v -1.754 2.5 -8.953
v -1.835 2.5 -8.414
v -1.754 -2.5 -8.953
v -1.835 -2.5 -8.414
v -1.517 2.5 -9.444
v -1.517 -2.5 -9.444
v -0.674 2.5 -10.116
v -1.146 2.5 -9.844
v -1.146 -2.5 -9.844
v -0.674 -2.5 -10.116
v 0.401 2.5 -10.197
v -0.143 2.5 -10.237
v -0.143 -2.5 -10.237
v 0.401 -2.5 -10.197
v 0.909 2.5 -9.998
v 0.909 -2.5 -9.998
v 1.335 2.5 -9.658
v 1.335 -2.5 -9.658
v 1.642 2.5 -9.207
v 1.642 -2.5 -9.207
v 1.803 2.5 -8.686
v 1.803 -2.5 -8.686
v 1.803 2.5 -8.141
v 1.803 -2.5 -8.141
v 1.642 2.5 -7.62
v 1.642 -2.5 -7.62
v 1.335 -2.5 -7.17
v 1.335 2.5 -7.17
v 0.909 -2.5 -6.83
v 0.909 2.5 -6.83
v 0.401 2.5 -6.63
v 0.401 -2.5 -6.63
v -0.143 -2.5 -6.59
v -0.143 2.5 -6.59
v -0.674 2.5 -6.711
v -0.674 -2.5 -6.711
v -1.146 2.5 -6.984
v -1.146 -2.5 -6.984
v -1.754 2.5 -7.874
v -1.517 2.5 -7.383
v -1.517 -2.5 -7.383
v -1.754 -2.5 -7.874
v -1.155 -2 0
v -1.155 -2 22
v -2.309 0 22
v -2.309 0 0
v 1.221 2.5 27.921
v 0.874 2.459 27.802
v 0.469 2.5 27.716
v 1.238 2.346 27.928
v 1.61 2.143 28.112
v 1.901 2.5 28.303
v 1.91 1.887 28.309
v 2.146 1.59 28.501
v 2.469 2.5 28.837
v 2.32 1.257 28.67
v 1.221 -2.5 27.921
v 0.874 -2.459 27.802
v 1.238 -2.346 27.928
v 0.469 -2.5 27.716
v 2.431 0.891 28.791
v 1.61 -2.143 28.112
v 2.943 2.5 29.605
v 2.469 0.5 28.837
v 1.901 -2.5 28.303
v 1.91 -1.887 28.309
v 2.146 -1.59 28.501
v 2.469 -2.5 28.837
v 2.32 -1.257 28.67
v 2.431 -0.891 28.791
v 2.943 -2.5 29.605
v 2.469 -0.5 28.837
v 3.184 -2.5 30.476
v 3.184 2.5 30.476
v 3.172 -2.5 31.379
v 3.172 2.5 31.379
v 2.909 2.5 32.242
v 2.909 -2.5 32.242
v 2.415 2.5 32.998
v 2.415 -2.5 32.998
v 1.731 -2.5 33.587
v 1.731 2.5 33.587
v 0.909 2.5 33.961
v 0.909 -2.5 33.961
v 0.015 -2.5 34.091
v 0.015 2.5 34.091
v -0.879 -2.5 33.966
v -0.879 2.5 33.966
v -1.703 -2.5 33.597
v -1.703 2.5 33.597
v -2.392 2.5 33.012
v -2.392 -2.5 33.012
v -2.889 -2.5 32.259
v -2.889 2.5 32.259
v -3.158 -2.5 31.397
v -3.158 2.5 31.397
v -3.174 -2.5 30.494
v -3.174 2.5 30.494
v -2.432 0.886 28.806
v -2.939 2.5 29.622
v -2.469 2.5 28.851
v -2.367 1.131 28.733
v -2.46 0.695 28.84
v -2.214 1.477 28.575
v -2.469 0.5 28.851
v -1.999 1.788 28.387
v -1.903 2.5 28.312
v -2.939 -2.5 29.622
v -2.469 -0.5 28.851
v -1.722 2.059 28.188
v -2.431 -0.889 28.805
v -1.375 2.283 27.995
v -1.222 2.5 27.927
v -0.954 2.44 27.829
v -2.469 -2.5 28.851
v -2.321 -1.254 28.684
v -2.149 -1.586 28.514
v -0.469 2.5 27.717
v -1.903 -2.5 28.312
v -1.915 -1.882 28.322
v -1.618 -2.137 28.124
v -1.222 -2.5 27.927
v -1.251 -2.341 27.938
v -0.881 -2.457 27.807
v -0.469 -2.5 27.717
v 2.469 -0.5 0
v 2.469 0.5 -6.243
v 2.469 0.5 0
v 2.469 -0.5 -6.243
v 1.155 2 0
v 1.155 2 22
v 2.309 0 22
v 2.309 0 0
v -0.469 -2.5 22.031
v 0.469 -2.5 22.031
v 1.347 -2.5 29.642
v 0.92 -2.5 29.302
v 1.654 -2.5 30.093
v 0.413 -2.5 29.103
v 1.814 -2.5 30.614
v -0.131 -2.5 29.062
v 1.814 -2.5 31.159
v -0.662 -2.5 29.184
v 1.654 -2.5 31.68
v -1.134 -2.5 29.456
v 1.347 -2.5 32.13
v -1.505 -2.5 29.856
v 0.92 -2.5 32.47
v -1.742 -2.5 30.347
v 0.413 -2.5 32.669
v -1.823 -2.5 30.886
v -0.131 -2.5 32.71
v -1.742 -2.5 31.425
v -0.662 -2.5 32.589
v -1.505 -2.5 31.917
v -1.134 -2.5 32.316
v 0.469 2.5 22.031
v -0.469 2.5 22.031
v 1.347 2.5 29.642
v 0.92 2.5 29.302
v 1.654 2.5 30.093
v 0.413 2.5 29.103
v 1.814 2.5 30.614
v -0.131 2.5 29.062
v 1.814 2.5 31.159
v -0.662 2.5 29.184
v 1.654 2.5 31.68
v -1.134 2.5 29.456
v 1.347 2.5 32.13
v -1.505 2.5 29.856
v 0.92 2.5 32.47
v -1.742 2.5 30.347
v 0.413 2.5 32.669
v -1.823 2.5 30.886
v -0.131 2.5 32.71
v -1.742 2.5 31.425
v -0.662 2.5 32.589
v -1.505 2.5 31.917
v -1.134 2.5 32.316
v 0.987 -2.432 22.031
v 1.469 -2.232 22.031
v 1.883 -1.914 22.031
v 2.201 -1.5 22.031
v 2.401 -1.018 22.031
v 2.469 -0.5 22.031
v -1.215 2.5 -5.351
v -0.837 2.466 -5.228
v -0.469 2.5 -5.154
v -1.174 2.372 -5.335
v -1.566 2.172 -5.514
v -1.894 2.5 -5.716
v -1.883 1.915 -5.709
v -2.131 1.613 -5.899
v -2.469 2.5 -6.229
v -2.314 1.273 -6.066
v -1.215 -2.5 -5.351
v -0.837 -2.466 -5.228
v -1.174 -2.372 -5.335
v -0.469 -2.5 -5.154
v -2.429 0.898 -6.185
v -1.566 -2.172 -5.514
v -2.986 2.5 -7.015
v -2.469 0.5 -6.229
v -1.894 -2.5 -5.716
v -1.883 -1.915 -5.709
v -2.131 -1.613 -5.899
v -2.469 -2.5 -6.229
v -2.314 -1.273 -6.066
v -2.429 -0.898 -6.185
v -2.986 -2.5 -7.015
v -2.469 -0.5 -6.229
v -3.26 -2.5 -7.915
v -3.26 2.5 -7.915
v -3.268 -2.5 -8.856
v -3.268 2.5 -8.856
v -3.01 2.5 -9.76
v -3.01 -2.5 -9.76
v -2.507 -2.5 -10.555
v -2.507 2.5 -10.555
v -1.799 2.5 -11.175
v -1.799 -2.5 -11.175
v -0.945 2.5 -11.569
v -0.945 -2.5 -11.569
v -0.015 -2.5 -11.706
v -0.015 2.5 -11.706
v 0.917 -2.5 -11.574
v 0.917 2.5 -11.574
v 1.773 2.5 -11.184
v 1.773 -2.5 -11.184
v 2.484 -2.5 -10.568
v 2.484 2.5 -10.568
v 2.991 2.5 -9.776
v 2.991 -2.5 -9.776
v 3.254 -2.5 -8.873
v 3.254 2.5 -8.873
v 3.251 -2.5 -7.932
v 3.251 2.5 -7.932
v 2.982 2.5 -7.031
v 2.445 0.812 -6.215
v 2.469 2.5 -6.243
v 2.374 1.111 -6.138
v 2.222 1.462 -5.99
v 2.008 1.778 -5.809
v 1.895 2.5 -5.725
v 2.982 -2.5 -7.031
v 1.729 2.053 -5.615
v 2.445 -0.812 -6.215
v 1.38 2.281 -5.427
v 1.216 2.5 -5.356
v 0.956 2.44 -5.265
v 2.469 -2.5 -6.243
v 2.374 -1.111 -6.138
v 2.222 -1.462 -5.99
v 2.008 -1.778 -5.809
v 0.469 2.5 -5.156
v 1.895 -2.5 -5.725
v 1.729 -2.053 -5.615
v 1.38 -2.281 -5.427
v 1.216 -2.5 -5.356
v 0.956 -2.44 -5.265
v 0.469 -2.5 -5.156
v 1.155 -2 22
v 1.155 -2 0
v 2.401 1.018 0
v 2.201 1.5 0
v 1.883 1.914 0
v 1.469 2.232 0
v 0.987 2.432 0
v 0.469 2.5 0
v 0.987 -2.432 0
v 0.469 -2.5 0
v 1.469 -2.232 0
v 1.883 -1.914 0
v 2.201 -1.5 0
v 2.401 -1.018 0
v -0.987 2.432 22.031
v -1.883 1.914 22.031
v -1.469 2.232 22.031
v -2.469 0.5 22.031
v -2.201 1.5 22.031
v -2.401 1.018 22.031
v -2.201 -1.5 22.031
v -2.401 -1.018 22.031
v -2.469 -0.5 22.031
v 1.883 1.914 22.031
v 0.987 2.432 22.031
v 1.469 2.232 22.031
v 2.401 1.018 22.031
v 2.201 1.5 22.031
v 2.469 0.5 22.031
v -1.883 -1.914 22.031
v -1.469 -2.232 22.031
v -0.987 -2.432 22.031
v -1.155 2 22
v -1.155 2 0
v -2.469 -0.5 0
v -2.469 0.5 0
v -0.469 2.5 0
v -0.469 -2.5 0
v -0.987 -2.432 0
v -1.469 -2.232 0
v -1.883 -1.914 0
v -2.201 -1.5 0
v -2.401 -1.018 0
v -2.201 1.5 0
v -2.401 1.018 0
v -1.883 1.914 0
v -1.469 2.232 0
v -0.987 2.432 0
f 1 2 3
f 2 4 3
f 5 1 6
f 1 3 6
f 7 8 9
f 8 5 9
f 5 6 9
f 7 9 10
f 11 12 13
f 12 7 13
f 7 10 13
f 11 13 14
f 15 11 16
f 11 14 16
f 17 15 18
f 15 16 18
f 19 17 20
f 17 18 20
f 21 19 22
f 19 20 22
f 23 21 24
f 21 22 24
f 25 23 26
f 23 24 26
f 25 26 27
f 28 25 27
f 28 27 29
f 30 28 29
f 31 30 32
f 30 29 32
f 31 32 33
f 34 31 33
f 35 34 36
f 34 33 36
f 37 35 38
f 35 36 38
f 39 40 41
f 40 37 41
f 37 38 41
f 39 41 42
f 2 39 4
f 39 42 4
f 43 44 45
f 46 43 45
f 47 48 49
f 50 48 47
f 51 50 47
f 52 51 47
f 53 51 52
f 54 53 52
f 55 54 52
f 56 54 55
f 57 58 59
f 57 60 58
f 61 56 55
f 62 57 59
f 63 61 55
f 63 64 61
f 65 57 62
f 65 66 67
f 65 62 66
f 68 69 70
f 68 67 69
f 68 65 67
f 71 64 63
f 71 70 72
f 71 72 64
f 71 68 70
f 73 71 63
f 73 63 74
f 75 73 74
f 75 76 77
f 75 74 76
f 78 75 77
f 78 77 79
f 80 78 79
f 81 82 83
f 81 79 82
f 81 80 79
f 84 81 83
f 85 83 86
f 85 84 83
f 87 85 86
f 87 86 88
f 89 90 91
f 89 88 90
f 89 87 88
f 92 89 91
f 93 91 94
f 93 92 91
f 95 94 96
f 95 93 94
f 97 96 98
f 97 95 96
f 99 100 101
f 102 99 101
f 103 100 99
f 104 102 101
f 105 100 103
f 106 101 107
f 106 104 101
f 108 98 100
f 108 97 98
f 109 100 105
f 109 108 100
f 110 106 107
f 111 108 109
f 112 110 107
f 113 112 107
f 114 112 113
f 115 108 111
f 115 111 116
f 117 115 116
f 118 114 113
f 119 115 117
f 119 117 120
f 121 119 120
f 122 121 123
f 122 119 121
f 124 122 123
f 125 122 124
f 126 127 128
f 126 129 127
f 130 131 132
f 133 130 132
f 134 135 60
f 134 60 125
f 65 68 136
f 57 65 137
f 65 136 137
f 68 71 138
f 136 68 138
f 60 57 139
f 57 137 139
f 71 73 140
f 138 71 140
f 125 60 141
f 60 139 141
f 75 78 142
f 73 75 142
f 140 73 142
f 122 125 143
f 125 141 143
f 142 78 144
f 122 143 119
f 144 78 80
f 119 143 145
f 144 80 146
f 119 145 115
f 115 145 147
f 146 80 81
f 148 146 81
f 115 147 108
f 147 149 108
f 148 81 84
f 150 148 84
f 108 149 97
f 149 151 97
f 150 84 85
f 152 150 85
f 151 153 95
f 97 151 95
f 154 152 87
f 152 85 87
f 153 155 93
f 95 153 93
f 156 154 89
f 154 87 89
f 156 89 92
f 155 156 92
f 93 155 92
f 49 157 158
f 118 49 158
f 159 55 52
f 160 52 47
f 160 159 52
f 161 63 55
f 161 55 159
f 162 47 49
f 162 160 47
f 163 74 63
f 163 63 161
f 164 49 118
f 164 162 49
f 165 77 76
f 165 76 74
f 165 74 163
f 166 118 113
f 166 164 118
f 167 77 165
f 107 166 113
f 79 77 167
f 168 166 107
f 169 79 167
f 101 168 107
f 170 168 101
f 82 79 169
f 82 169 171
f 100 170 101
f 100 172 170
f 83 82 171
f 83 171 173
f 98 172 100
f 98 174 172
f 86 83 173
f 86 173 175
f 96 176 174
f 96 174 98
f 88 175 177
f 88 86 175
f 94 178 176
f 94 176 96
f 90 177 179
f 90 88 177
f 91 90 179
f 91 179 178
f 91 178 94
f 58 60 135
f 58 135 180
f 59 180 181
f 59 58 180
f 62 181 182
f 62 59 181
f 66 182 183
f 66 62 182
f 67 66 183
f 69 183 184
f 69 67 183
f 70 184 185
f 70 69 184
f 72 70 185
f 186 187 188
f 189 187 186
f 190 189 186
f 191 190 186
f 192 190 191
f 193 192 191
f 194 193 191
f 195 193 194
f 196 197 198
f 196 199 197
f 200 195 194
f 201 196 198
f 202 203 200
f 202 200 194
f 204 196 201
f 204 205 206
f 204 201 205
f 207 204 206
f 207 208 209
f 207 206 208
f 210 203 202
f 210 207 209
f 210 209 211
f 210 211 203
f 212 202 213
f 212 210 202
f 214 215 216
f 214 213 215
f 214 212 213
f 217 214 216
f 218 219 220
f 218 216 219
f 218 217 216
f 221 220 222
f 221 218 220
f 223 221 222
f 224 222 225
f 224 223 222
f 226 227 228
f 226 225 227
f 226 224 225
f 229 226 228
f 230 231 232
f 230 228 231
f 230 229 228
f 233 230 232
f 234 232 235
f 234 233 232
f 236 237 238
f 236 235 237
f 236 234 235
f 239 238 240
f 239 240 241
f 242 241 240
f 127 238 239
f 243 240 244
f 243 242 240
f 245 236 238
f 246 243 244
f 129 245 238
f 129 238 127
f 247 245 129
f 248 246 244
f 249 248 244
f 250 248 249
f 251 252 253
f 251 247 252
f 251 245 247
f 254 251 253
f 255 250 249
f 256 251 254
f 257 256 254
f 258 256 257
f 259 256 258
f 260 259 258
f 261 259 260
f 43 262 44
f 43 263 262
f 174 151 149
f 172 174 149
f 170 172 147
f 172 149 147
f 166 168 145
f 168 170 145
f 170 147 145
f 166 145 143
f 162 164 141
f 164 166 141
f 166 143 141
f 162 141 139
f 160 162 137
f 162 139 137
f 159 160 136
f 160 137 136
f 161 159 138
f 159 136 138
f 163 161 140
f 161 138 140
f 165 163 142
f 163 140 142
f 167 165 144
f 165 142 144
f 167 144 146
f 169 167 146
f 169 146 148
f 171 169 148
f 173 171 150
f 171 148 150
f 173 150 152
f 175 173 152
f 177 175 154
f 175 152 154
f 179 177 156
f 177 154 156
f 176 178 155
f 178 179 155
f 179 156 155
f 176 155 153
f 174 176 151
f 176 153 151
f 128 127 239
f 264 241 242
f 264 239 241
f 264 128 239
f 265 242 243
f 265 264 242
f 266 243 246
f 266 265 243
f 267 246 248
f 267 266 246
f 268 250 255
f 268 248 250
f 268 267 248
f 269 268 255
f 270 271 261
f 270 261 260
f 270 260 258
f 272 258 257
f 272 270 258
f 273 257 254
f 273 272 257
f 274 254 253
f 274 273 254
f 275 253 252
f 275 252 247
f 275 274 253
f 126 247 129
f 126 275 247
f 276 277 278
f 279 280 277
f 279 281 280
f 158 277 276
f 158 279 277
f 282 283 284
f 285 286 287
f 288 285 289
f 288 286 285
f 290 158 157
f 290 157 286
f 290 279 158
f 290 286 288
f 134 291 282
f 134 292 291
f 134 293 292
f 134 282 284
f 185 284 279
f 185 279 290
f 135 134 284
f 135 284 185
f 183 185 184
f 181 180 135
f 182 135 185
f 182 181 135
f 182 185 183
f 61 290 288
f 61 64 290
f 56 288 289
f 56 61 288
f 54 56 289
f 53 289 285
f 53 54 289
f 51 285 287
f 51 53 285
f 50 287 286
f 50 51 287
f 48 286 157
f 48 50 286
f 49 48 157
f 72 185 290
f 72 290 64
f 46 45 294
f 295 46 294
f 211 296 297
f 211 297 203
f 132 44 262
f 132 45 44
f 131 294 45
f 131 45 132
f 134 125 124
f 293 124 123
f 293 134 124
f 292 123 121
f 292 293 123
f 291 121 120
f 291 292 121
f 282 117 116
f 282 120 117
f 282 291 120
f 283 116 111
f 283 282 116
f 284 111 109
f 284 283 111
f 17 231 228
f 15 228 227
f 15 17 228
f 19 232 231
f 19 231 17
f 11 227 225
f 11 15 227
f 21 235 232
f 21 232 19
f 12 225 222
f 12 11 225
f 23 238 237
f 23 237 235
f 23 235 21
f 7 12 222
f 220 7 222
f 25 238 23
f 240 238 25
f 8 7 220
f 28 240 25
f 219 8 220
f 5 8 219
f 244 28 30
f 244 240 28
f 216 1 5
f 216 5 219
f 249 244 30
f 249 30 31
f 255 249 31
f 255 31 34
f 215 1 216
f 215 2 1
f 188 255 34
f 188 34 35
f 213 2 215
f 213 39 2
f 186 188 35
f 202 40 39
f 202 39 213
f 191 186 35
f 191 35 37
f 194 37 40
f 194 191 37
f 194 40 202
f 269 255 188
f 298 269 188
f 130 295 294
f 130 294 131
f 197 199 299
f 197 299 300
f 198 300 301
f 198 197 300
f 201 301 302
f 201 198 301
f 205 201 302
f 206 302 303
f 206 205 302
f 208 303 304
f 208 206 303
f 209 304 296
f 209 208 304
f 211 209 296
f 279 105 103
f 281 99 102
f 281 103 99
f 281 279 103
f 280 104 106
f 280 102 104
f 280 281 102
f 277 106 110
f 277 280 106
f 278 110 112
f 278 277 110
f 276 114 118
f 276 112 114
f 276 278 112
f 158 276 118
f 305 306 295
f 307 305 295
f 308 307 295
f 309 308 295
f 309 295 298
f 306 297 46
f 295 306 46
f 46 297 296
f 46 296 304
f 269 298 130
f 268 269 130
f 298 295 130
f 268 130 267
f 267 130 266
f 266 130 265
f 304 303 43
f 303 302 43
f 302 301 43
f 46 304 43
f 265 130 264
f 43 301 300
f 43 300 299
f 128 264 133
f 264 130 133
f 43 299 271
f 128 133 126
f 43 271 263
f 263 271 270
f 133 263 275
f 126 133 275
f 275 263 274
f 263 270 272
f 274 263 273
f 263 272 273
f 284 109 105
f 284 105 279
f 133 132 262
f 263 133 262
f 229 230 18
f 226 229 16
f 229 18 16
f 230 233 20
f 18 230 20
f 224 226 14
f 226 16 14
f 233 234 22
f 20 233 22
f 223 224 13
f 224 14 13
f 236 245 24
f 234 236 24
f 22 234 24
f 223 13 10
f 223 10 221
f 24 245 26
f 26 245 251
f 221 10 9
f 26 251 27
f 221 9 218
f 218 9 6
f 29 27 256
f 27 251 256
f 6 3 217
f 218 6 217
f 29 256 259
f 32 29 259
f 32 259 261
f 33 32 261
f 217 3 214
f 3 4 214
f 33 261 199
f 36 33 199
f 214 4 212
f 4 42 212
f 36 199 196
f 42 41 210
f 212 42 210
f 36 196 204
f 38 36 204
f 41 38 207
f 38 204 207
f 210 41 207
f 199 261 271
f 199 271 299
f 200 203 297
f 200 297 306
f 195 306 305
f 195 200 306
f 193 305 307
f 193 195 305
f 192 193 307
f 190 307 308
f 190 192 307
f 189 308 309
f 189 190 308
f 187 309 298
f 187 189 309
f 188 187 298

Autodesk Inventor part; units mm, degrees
ref_plane "YZ Plane" through (0, 0, 0) normal (1, 0, 0) x (0, 1, 0)
ref_plane "XZ Plane" through (0, 0, 0) normal (0, 1, 0) x (-1, 0, 0)
ref_plane "XY Plane" through (0, 0, 0) normal (0, 0, 1) x (1, 0, 0)
sketch "Sketch1" plane through (0, 0, 0) normal (0, 0, 1) x (1, 0, 0)
  line L0 (2.3094, 0) -> (1.1547, -2)
  line L1 (1.1547, -2) -> (-1.1547, -2)
  line L2 (-1.1547, -2) -> (-2.3094, 0)
  line L3 (-2.3094, 0) -> (-1.1547, 2)
  line L4 (-1.1547, 2) -> (1.1547, 2)
  line L5 (1.1547, 2) -> (2.3094, 0)
  point P0 (0, 0)
  point P1 (0, 0)
  point P2 (0, -2)
  dimension "d0" = 4
extrude "Extrusion1" add sketch "Sketch1" along normal blind 22
sketch "Sketch3" plane through (0, 0, 0) normal (0, 1, 0) x (-1, 0, 0)
  circle A0 centre (0.0059, -8.4136) radius 1.829
  line L0 (2.4692, 0) -> (2.4692, -6.2293)
  line L1 (-2.4692, -6.2426) -> (-2.4692, 0)
  arc A1 (-2.4692, -6.2426) -> (2.4692, -6.2293) centre (0.0059, -8.4136) ccw
  circle A2 centre (-0.0059, 30.8862) radius 1.829
  line L2 (-2.4692, 22.031) -> (-2.4692, 28.8369)
  line L3 (2.4692, 28.8511) -> (2.4692, 22.031)
  arc A3 (2.4692, 28.8511) -> (-2.4692, 28.8369) centre (-0.0059, 30.8862) ccw
  line L4 (1.1547, 22) -> (2.3094, 22) projected
  line L5 (2.4692, 22.031) -> (-2.4692, 22.031)
  line L6 (2.4692, 0) -> (-2.4692, 0)
  circle A4 centre (0.0059, -8.4136) radius 1.829
  line L7 (-1.1547, 22) -> (-2.3094, 22) projected
  line L8 (2.3094, 22) -> (-2.3094, 22)
  point P0 (1.1547, 34.4)
  point P1 (2.3094, 34.4)
extrude "Extrusion3" add sketch "Sketch3" along normal mid plane 5 contours L2 A3 L3 L5
extrude "Extrusion4" add sketch "Sketch3" along normal mid plane 5 contours L0 A1 L1 L6
fillet "Fillet1" radius 2 8 edges at (2.4692, 2.5, -3.1213) (-2.4692, 2.5, -3.1146) (2.4692, -2.5, -3.1213) (-2.4692, -2.5, -3.1146) (2.4692, -2.5, 25.4339) (2.4692, 2.5, 25.4339) (-2.4692, 2.5, 25.441) (-2.4692, -2.5, 25.441)
properties part number "PX9200-22"
